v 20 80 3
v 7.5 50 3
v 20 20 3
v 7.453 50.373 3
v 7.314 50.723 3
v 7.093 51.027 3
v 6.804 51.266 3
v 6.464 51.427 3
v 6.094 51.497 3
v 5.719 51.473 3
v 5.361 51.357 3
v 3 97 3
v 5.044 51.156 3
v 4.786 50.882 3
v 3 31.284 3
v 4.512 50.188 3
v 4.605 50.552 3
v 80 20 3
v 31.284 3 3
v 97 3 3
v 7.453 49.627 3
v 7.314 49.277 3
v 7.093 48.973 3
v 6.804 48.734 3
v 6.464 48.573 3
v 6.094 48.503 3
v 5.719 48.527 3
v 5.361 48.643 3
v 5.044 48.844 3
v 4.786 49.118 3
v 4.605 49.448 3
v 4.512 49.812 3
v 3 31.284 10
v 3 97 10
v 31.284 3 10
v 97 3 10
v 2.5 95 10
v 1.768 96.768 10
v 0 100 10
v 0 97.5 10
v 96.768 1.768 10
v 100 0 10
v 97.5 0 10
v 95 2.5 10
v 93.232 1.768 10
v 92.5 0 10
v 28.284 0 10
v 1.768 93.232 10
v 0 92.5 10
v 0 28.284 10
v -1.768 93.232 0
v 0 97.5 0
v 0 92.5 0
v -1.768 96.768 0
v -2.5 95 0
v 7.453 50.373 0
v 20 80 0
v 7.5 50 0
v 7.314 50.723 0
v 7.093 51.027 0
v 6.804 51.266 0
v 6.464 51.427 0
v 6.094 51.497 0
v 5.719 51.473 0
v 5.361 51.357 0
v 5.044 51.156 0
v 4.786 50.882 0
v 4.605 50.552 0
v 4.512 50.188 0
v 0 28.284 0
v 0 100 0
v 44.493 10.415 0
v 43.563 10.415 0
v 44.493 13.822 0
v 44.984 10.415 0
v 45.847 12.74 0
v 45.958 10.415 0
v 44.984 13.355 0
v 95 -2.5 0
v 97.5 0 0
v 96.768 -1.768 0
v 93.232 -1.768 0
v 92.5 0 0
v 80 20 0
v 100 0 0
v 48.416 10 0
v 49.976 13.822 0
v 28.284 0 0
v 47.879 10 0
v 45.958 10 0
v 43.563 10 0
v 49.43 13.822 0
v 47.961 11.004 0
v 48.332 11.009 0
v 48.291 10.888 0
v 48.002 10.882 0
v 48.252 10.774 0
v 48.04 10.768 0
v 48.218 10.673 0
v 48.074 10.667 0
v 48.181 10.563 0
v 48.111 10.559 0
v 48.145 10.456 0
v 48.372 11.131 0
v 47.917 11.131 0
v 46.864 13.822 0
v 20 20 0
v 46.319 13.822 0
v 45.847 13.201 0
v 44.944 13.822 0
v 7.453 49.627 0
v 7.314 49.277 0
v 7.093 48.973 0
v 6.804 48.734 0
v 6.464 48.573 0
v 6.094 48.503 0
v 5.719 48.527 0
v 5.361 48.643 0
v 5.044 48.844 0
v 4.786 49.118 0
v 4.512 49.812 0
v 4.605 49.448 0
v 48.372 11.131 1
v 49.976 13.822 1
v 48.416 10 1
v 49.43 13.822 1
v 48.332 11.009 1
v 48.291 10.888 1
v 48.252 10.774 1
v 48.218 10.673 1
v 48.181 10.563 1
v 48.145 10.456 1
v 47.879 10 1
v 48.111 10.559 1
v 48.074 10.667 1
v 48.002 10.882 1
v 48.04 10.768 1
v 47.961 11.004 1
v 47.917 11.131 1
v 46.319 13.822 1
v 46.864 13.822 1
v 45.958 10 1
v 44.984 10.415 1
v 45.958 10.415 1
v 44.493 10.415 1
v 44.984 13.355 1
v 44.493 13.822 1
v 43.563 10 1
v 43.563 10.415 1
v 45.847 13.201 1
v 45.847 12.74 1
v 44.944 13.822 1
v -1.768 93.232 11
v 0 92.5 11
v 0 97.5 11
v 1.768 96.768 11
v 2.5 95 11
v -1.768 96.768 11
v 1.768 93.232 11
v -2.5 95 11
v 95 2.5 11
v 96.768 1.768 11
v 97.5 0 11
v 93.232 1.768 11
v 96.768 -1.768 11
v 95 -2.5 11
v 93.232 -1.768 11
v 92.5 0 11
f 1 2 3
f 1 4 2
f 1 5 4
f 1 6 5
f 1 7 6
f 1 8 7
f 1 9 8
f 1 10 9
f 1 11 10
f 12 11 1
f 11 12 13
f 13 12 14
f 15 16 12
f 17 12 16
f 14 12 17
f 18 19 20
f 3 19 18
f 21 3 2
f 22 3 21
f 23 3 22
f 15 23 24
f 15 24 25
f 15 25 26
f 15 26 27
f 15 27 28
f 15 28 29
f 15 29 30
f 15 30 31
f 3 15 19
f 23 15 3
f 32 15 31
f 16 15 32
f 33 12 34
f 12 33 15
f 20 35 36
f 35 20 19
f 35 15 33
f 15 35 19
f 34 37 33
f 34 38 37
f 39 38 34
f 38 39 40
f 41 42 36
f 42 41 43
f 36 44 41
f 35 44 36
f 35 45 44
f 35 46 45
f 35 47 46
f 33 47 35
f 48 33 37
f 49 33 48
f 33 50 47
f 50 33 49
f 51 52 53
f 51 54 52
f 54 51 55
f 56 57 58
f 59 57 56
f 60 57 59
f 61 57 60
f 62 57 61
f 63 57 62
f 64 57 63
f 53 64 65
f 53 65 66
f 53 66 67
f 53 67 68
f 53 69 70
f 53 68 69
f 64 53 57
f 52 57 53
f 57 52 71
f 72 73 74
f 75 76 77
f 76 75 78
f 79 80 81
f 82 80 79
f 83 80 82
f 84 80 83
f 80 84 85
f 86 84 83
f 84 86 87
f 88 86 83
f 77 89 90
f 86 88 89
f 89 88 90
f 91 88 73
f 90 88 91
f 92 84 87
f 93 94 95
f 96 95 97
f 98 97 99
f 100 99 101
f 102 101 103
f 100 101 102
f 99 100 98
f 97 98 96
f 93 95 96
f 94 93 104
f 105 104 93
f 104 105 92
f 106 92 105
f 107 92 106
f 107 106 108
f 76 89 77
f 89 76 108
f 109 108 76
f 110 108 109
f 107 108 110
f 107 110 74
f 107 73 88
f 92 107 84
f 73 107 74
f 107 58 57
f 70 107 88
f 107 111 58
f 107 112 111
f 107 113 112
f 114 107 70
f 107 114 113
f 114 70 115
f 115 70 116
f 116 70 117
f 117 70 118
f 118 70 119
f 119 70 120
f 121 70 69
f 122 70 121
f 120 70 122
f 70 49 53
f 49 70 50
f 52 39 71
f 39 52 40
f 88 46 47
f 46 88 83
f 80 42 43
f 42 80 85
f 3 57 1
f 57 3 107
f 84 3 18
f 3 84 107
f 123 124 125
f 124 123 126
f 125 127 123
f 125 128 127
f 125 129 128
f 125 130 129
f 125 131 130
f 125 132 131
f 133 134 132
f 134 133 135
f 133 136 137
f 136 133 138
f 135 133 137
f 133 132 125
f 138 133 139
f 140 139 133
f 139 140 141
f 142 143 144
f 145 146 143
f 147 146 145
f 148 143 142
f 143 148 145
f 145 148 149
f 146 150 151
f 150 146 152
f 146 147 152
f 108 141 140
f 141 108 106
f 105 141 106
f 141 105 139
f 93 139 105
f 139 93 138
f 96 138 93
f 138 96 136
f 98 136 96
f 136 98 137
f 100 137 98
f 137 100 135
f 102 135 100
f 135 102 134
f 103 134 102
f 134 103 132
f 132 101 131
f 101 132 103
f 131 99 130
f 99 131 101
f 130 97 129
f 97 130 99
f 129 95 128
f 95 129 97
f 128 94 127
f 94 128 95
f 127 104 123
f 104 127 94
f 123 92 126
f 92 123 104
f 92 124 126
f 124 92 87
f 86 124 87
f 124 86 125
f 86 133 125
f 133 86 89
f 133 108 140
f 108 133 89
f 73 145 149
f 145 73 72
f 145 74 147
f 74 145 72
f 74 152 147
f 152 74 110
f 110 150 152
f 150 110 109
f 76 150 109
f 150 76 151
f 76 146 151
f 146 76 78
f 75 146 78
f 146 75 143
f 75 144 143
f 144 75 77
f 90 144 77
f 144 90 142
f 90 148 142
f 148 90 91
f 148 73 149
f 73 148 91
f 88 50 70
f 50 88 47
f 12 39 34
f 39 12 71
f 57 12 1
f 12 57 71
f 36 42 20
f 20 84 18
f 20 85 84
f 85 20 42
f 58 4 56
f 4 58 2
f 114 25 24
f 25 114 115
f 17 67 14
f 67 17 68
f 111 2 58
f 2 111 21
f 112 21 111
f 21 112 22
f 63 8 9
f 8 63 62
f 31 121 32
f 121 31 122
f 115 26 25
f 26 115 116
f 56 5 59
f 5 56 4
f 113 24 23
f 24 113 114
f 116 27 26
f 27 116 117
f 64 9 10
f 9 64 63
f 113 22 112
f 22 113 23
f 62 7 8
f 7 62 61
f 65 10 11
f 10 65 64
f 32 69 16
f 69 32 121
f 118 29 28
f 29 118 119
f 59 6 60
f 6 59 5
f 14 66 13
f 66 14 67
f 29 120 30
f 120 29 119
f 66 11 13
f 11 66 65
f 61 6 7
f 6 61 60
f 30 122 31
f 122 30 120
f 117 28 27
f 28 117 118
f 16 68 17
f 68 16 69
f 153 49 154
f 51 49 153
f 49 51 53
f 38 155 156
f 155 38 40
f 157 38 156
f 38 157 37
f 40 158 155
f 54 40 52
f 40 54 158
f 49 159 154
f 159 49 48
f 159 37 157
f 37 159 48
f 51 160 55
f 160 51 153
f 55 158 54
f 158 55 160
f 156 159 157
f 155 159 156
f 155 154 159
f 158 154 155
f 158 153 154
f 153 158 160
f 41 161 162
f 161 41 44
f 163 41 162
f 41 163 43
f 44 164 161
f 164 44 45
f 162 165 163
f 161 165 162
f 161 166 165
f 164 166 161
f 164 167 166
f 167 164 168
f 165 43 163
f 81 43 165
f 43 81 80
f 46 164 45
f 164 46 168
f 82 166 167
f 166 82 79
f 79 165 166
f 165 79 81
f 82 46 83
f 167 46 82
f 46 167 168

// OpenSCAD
// these are all guesses ATM, but the bounding box should be limited to ~100mm3
design_version = "V1";
length = 100;
height = 100;
depth = 10;
frame_width = 20;
shelf_thickness = 3;
perimeter_thickness = 3;
screw_diameter = 3;
tab_diameter = 5;

difference(){
    // bounding box
    cube([length, height, depth]);
    
    // main cut-out
    translate([frame_width, frame_width, -1]){
        cube([length, height, depth + 2]);
    }
    
	// watermark
    rotate([0,180,0]){
        translate([-length/2,10,-1]){
            linear_extrude(height = 10){
               #text(design_version,size=4);
            }
        }
    }
    
    // this prevents shelf cut from penetrating the perimeter
    difference(){
        
        // shelf cut-out
        translate([perimeter_thickness, perimeter_thickness,        shelf_thickness]){
            cube([length, height, depth + 2]);
        }    
        
        // outer slash cut
        translate([perimeter_thickness, perimeter_thickness,0]){
            rotate([0,0,-45]){
                translate([-length,0,-1]){
                    cube([length *2, frame_width, depth +2]);
                }
            }     
        } 
    }
    
    // outer slash cut
    rotate([0,0,-45]){
        translate([-length,0,-1]){
            cube([length *2, frame_width, depth +2]);
        }
    }
    
    // inner slash cut
    translate([length/2, height/2, 0]){
        rotate([0,0,-45]){
            translate([-length,0,-1]){
                cube([length *2, frame_width, depth +2]);
            }
        }
    }

    // mounting hole (complete guess for now)
    translate([perimeter_thickness*2, height/2,-1]){
        cylinder(r=screw_diameter/2,h=shelf_thickness+2,$fn=25);
    }
}

// upper tab
translate([0,height-5,0]){
    cylinder(r=tab_diameter/2,h=depth+1);
}

// lower tab
translate([length-5,0,0]){
    cylinder(r=tab_diameter/2,h=depth+1);
}
